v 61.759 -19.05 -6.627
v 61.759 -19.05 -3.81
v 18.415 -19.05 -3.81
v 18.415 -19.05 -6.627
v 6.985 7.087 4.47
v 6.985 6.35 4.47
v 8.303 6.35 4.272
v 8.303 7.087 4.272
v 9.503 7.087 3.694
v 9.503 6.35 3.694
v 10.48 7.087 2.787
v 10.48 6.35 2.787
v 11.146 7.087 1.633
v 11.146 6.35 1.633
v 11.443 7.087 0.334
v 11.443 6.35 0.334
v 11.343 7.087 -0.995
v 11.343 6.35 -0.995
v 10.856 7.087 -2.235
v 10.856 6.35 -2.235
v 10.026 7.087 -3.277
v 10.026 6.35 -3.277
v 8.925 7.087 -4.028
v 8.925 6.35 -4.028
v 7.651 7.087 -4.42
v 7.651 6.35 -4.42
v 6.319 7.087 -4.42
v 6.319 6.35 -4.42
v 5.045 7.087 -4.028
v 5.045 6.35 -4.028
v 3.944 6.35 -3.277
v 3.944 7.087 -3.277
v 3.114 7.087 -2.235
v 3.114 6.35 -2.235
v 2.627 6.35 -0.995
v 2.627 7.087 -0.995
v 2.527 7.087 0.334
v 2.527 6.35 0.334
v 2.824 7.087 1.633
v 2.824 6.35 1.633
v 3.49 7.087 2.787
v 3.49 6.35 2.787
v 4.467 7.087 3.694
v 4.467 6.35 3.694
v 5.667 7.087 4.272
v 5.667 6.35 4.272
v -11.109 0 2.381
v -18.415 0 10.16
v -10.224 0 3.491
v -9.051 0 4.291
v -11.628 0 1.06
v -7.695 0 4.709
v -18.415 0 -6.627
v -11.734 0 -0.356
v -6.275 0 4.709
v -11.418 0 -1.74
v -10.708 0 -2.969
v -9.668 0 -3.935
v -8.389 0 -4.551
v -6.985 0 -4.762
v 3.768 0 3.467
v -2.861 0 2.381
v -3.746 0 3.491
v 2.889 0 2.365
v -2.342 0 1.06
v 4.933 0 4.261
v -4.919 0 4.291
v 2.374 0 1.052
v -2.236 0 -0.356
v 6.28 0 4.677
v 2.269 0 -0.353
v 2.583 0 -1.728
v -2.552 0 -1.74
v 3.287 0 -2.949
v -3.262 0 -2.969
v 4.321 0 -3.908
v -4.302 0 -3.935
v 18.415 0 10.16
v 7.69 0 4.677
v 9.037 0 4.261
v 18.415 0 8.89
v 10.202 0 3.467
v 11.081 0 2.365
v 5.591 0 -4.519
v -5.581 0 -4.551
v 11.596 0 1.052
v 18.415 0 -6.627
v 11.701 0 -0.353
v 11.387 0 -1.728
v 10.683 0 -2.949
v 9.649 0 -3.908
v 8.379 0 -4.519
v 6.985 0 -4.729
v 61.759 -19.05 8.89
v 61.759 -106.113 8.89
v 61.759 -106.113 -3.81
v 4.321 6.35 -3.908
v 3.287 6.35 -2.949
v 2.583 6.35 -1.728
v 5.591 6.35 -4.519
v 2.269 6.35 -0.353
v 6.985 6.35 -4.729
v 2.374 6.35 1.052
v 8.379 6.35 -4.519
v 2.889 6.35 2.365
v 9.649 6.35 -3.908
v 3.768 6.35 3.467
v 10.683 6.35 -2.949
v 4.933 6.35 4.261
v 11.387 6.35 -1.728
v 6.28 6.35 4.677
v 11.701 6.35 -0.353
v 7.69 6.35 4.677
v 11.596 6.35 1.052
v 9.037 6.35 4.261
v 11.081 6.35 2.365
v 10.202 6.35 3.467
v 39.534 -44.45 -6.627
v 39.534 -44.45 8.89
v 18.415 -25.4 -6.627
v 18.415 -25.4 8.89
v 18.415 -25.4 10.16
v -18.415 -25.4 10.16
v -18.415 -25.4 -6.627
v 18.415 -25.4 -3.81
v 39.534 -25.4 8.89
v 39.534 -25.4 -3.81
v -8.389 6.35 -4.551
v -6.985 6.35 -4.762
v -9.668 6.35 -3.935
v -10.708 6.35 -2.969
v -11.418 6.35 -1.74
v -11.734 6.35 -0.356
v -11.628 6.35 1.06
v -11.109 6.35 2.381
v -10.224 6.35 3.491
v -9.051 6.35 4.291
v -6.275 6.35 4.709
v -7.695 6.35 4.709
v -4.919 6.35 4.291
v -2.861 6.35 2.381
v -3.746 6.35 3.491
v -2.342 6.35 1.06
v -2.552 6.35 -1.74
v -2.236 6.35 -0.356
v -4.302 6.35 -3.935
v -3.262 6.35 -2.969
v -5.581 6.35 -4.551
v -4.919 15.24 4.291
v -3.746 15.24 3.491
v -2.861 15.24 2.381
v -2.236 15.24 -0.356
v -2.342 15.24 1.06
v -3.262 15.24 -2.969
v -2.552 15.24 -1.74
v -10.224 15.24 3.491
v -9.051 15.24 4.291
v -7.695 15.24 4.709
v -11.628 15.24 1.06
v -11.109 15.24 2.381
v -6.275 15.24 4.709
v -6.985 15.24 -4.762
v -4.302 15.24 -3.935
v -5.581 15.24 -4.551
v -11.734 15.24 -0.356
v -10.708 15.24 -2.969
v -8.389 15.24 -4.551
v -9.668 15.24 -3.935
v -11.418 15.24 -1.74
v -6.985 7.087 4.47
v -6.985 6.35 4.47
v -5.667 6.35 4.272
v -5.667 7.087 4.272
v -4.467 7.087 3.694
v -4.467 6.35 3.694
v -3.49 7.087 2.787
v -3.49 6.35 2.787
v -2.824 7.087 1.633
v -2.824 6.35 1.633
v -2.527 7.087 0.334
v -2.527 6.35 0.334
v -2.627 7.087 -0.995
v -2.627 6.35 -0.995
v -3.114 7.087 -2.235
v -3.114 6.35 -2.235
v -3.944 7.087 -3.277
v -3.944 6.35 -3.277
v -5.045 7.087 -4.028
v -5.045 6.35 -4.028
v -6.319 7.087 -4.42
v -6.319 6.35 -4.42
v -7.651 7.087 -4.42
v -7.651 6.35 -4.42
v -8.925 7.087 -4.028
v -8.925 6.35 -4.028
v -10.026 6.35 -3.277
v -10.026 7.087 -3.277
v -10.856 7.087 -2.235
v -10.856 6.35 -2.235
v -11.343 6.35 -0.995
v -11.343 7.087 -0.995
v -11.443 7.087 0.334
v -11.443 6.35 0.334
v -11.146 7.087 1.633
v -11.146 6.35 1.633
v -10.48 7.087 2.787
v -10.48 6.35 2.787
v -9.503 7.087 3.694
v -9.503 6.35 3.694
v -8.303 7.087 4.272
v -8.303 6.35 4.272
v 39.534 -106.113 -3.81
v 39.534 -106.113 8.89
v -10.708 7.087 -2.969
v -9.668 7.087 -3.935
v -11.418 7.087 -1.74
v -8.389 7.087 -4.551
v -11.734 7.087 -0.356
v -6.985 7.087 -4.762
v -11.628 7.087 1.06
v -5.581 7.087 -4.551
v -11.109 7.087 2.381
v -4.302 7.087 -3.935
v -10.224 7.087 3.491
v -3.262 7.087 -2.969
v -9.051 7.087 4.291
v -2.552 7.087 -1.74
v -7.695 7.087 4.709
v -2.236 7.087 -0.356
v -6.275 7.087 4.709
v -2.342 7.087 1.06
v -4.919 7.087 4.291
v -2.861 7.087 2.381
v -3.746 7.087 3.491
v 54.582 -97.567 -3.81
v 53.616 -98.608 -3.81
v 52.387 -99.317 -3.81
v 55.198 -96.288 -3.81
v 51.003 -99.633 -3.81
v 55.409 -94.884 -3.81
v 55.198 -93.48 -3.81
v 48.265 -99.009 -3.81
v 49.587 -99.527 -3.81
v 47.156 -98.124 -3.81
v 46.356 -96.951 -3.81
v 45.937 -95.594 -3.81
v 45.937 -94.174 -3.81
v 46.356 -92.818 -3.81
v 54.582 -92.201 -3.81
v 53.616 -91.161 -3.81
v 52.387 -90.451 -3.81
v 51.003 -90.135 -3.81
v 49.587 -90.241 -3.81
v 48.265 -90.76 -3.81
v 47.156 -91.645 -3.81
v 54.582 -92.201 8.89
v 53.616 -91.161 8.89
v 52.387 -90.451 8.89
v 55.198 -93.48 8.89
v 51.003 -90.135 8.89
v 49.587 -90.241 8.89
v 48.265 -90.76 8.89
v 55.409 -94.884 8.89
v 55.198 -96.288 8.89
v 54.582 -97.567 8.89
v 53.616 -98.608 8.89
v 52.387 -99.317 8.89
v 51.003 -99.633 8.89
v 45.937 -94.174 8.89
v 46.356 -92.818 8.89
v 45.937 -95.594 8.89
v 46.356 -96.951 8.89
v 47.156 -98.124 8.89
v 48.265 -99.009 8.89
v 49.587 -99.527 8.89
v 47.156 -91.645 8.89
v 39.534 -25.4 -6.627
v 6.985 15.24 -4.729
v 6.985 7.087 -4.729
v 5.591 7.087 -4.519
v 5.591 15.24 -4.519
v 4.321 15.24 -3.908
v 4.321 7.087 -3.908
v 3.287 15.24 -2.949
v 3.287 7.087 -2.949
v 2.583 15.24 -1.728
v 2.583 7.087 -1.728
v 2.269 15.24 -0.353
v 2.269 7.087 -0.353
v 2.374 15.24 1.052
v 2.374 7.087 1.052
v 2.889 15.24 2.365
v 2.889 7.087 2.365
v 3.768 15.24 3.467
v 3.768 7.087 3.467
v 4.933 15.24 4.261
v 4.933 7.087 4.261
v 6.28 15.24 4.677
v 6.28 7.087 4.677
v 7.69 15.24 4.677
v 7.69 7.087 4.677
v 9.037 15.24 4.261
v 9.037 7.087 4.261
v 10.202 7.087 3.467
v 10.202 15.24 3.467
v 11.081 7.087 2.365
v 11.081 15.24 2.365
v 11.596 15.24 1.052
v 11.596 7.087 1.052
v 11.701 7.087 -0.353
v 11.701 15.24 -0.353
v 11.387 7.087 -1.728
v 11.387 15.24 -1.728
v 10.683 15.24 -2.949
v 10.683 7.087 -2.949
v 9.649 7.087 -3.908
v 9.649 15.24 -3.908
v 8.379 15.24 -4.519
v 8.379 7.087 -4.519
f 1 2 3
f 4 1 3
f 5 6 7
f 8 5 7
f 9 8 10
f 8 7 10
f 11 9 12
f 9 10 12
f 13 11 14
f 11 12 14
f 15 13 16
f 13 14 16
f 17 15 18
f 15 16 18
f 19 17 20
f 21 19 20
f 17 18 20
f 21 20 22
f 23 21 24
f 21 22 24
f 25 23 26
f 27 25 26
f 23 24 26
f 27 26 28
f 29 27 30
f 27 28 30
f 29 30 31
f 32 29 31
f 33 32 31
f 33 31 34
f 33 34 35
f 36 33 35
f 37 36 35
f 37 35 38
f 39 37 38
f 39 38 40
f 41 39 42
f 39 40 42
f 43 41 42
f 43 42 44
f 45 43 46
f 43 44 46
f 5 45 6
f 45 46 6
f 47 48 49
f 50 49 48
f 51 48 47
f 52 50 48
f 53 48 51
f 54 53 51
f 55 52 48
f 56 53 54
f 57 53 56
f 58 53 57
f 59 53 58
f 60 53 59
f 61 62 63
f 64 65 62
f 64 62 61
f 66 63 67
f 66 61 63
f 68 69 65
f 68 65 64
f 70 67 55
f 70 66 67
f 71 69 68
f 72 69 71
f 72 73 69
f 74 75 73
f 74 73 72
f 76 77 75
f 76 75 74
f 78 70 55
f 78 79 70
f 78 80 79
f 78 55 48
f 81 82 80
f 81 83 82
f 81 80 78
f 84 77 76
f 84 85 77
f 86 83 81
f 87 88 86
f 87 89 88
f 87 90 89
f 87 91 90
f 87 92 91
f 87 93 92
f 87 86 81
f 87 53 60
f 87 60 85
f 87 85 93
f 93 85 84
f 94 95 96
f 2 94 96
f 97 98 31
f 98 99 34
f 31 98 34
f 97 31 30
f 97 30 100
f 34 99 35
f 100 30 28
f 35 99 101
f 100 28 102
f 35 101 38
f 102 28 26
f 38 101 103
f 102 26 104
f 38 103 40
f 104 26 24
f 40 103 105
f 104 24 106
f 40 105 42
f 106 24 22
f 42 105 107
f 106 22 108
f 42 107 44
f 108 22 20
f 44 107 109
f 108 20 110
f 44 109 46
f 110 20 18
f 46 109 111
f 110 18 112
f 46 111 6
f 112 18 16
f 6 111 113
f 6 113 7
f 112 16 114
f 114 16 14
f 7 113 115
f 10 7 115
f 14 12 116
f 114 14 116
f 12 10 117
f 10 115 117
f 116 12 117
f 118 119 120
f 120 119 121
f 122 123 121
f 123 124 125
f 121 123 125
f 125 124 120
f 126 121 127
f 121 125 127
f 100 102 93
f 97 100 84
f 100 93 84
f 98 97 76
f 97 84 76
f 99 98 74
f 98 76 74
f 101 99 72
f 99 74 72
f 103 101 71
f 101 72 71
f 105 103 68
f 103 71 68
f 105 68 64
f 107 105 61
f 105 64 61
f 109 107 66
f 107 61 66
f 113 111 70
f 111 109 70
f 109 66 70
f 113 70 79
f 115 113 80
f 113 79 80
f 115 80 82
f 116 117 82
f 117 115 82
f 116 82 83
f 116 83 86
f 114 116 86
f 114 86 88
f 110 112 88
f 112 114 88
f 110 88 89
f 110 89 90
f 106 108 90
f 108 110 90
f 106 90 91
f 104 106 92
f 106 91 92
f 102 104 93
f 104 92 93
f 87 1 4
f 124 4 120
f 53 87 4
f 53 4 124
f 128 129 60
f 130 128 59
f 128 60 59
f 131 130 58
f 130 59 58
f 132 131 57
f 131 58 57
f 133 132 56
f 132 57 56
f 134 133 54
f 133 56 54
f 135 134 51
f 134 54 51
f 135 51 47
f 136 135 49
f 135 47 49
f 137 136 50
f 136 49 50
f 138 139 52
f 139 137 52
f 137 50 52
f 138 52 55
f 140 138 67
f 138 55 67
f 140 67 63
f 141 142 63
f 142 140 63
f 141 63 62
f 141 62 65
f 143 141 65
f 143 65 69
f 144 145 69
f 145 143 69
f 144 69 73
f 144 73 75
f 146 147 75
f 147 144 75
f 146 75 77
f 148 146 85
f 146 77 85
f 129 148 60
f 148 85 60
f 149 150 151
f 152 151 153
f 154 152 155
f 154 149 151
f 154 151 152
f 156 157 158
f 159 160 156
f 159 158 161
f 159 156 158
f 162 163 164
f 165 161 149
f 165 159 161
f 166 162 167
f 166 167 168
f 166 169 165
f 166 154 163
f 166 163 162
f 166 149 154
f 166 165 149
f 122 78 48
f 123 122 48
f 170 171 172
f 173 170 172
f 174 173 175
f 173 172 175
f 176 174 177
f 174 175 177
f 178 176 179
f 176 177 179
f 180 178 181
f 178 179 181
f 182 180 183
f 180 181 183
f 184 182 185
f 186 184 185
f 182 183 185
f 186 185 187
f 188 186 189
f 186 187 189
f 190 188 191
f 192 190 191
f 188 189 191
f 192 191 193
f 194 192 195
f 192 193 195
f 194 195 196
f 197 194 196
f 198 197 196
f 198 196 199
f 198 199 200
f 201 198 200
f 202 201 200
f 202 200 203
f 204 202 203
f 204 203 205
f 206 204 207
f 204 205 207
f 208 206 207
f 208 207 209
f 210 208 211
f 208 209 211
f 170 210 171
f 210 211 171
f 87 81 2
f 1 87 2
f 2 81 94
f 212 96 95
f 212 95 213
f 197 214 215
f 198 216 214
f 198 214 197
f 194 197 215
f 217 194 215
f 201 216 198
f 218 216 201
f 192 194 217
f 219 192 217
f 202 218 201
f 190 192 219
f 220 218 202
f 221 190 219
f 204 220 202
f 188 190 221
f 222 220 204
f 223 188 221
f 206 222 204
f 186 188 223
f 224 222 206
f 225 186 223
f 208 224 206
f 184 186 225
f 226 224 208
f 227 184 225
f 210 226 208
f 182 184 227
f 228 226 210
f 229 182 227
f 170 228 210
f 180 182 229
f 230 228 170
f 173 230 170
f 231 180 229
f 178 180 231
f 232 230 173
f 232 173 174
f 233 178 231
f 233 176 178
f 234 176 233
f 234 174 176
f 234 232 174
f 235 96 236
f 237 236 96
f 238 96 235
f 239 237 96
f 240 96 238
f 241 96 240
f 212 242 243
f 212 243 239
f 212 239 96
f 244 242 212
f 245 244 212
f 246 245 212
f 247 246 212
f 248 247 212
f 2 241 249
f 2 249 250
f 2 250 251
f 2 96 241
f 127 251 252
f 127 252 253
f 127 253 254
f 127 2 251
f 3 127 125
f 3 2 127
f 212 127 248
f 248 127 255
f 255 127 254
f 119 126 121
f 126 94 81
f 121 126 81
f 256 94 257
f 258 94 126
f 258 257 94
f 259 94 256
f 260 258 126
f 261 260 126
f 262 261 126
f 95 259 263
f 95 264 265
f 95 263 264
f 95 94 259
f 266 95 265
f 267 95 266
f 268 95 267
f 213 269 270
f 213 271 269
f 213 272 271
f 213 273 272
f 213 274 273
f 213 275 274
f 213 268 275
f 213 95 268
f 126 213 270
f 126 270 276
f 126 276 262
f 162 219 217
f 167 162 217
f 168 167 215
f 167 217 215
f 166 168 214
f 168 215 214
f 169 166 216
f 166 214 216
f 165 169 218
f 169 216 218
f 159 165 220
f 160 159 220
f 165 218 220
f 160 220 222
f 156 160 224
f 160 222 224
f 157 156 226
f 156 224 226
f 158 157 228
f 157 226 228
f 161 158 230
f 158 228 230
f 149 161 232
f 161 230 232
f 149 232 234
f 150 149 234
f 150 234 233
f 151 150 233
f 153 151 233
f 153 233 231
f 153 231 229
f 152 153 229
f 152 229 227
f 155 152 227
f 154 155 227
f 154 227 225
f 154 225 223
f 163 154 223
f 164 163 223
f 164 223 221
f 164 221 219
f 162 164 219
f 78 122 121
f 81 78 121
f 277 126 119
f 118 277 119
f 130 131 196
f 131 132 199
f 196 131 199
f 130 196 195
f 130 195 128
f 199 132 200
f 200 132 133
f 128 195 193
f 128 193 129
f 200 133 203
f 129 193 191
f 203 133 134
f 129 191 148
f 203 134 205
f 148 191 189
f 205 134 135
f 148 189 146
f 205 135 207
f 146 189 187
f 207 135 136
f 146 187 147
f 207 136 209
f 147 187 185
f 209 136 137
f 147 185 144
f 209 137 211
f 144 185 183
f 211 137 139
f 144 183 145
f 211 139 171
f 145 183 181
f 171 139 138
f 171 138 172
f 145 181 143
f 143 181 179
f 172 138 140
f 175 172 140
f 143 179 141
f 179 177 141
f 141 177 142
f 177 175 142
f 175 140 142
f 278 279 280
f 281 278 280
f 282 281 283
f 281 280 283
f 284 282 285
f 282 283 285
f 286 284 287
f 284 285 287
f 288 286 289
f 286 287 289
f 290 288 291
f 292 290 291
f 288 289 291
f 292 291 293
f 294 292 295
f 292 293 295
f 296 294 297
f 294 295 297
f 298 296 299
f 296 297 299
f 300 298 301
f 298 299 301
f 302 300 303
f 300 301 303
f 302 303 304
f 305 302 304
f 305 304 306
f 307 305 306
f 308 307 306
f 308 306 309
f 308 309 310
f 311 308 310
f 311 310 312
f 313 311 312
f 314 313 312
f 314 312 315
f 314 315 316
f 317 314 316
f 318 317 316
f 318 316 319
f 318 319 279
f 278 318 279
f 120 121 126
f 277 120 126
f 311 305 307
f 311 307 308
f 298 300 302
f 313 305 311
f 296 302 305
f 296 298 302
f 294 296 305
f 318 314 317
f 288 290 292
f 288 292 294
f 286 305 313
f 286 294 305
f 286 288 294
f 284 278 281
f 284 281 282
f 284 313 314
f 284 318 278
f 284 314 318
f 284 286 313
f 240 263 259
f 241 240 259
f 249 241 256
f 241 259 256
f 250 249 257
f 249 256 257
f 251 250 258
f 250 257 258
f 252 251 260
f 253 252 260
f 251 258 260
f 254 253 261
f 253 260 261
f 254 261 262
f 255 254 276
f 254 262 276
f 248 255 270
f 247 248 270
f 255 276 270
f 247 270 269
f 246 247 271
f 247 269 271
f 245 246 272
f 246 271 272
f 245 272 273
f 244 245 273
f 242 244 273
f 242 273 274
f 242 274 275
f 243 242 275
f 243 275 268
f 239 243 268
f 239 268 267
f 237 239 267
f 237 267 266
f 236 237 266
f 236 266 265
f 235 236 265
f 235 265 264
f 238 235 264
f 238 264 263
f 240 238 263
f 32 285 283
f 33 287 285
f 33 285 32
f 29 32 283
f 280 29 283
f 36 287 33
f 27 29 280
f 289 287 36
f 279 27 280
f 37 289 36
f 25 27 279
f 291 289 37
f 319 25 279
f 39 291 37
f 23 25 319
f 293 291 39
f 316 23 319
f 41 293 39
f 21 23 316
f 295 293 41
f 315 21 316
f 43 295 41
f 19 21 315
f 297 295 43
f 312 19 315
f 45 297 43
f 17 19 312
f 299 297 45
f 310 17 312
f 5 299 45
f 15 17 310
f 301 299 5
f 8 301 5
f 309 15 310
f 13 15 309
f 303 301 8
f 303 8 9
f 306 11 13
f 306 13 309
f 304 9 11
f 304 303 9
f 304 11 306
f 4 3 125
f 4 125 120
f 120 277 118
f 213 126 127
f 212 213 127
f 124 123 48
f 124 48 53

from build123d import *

# Parameters (mm, degrees)
SKETCH1_W            = 36.83
SKETCH1_H            = 20.32
BOSS_EXTRUDE1_DEPTH  = 25.4
SKETCH2_W            = 12.7
SKETCH2_H            = 6.35
BOSS_EXTRUDE2_DEPTH  = 43.344230304
SKETCH3_W            = 22.225
SKETCH3_H            = 12.7
BOSS_EXTRUDE3_DEPTH  = 80.713490592
SKETCH4_R            = 4.7625
CUT_EXTRUDE1_DEPTH   = 125.246440244
SKETCH5_R            = 4.7625
SKETCH5_R_2          = 4.729383401
BOSS_EXTRUDE4_DEPTH  = 15.24
BOSS_EXTRUDE5_DEPTH  = 20.32
SKETCH8_W            = 43.344230304
SKETCH8_H            = 1.27
CUT_EXTRUDE2_DEPTH   = 108.226300513
BOSS_EXTRUDE10_DEPTH = 20.32
F_3DSKETCH3_R        = 5.08
CUT_EXTRUDE4_DEPTH   = 0.7366
SKETCH14_R           = 4.4704
BOSS_EXTRUDE11_DEPTH = 0.7366
SKETCH16_W           = 217.351888632
SKETCH16_H           = 211.359138863
CUT_EXTRUDE5_DEPTH   = 4.8028352


with BuildPart() as part:
    # Sketch1 → Boss-Extrude1 (new body)
    with BuildSketch(Plane(origin=(0, 0, 0), x_dir=(1, 0, 0), z_dir=(0, 1, 0))):
        Rectangle(SKETCH1_W, SKETCH1_H)
    extrude(amount=-BOSS_EXTRUDE1_DEPTH)

    # Sketch2 → Boss-Extrude2 (add)
    with BuildSketch(Plane(origin=(18.415, 0, 0), x_dir=(0, 0, -1), z_dir=(1, 0, 0))):
        with Locations((-2.54, -22.225)):
            Rectangle(SKETCH2_W, SKETCH2_H)
    extrude(amount=BOSS_EXTRUDE2_DEPTH)

    # Sketch3 → Boss-Extrude3 (add)
    with BuildSketch(Plane(origin=(0, -25.4, 0), x_dir=(-1, 0, 0), z_dir=(0, -1, 0))):
        with Locations((-50.646730304, -2.54)):
            Rectangle(SKETCH3_W, SKETCH3_H)
    extrude(amount=BOSS_EXTRUDE3_DEPTH)

    # Sketch4 → Cut-Extrude1 (cut, through all)
    with BuildSketch(Plane.XY.offset(8.89)):
        with Locations((50.646730304, -94.884200122)):
            Circle(SKETCH4_R)
    extrude(amount=-CUT_EXTRUDE1_DEPTH, mode=Mode.SUBTRACT)

    # Sketch5 → Boss-Extrude4 (add)
    with BuildSketch(Plane(origin=(0, 0, 0), x_dir=(1, 0, 0), z_dir=(0, 1, 0))):
        with Locations(Location((-6.985, 0, 0), (0, 0, 90))):
            Circle(SKETCH5_R)
        with Locations(Location((6.985, 0, 0), (0, 0, 90))):
            Circle(SKETCH5_R_2)
    extrude(amount=BOSS_EXTRUDE4_DEPTH)

    # Sketch7 → Boss-Extrude5 (add)
    with BuildSketch(Plane.XY.offset(10.16)):
        Polygon((18.415, 0), (61.759230304, -19.05), (18.415, -19.05), align=None)
    extrude(amount=-BOSS_EXTRUDE5_DEPTH)

    # Sketch8 → Cut-Extrude2 (cut, through all)
    with BuildSketch(Plane(origin=(0, -19.05, 0), x_dir=(-1, 0, 0), z_dir=(0, -1, 0))):
        with Locations((-40.087115152, -9.525)):
            Rectangle(SKETCH8_W, SKETCH8_H)
    extrude(amount=-CUT_EXTRUDE2_DEPTH, mode=Mode.SUBTRACT)

    # 3DSketch3 → Cut-Extrude4 (cut)
    with BuildSketch(Plane(origin=(-6.985, 6.35, 0), x_dir=(1, 0, 0), z_dir=(0, -1, 0))):
        Circle(F_3DSKETCH3_R)
        with Locations((13.97, 0)):
            Circle(F_3DSKETCH3_R)
    extrude(amount=-CUT_EXTRUDE4_DEPTH, mode=Mode.SUBTRACT)


with BuildPart() as body_2:
    # Sketch13 → Boss-Extrude10 (new body)
    with BuildSketch(Plane.XY.offset(8.89)):
        Polygon((18.415, -25.4), (39.534230304, -25.4), (39.534230304, -44.45), align=None)
    extrude(amount=-BOSS_EXTRUDE10_DEPTH)


with BuildPart() as cut_extrude4_piece_1:
    # of the separate pieces the step leaves, piece 1, a body of its own (cut_extrude4_pieces)
    add(part.part.solids().sort_by_distance((18.415, 0, 10.16))[0])



with BuildPart() as cut_extrude4_piece_2:
    # of the separate pieces the step leaves, piece 2, a body of its own (cut_extrude4_pieces)
    add(part.part.solids().sort_by_distance((-6.985, 7.0866, -4.7625))[0])


with BuildPart() as cut_extrude4_piece_3:
    # of the separate pieces the step leaves, piece 3, a body of its own (cut_extrude4_pieces)
    add(part.part.solids().sort_by_distance((6.985, 7.0866, -4.729383401))[0])


with BuildPart() as cut_extrude4_piece_1_1:
    add(cut_extrude4_piece_1.part)

    add(cut_extrude4_piece_2.part)  # Boss-Extrude11 merges Cut-Extrude4 piece 2

    add(cut_extrude4_piece_3.part)  # Boss-Extrude11 merges Cut-Extrude4 piece 3
    # Sketch14 → Boss-Extrude11 (add)
    with BuildSketch(Plane(origin=(0, 6.35, 0), x_dir=(1, 0, 0), z_dir=(0, 1, 0))):
        with Locations(Location((-6.985, 0, 0), (0, 0, 270))):
            Circle(SKETCH14_R)
        with Locations(Location((6.985, 0, 0), (0, 0, 270))):
            Circle(SKETCH14_R)
    extrude(amount=BOSS_EXTRUDE11_DEPTH)


with BuildPart() as cut_extrude5_tool:
    # Sketch16 → Cut-Extrude5 (new body)
    with BuildSketch(Plane(origin=(0, 0, -11.43), x_dir=(-1, 0, 0), z_dir=(0, 0, -1))):
        with Locations((-28.335198099, -31.581377013)):
            Rectangle(SKETCH16_W, SKETCH16_H)
    extrude(amount=-CUT_EXTRUDE5_DEPTH)


with BuildPart() as body_2_1:
    add(body_2.part)

    # Cut-Extrude5: cut by cut_extrude5_tool
    add(cut_extrude5_tool.part, mode=Mode.SUBTRACT)


with BuildPart() as cut_extrude4_piece_1_2:
    add(cut_extrude4_piece_1_1.part)

    # Cut-Extrude5: cut by cut_extrude5_tool
    add(cut_extrude5_tool.part, mode=Mode.SUBTRACT)


solid = Compound([body_2_1.part, cut_extrude4_piece_1_2.part])
